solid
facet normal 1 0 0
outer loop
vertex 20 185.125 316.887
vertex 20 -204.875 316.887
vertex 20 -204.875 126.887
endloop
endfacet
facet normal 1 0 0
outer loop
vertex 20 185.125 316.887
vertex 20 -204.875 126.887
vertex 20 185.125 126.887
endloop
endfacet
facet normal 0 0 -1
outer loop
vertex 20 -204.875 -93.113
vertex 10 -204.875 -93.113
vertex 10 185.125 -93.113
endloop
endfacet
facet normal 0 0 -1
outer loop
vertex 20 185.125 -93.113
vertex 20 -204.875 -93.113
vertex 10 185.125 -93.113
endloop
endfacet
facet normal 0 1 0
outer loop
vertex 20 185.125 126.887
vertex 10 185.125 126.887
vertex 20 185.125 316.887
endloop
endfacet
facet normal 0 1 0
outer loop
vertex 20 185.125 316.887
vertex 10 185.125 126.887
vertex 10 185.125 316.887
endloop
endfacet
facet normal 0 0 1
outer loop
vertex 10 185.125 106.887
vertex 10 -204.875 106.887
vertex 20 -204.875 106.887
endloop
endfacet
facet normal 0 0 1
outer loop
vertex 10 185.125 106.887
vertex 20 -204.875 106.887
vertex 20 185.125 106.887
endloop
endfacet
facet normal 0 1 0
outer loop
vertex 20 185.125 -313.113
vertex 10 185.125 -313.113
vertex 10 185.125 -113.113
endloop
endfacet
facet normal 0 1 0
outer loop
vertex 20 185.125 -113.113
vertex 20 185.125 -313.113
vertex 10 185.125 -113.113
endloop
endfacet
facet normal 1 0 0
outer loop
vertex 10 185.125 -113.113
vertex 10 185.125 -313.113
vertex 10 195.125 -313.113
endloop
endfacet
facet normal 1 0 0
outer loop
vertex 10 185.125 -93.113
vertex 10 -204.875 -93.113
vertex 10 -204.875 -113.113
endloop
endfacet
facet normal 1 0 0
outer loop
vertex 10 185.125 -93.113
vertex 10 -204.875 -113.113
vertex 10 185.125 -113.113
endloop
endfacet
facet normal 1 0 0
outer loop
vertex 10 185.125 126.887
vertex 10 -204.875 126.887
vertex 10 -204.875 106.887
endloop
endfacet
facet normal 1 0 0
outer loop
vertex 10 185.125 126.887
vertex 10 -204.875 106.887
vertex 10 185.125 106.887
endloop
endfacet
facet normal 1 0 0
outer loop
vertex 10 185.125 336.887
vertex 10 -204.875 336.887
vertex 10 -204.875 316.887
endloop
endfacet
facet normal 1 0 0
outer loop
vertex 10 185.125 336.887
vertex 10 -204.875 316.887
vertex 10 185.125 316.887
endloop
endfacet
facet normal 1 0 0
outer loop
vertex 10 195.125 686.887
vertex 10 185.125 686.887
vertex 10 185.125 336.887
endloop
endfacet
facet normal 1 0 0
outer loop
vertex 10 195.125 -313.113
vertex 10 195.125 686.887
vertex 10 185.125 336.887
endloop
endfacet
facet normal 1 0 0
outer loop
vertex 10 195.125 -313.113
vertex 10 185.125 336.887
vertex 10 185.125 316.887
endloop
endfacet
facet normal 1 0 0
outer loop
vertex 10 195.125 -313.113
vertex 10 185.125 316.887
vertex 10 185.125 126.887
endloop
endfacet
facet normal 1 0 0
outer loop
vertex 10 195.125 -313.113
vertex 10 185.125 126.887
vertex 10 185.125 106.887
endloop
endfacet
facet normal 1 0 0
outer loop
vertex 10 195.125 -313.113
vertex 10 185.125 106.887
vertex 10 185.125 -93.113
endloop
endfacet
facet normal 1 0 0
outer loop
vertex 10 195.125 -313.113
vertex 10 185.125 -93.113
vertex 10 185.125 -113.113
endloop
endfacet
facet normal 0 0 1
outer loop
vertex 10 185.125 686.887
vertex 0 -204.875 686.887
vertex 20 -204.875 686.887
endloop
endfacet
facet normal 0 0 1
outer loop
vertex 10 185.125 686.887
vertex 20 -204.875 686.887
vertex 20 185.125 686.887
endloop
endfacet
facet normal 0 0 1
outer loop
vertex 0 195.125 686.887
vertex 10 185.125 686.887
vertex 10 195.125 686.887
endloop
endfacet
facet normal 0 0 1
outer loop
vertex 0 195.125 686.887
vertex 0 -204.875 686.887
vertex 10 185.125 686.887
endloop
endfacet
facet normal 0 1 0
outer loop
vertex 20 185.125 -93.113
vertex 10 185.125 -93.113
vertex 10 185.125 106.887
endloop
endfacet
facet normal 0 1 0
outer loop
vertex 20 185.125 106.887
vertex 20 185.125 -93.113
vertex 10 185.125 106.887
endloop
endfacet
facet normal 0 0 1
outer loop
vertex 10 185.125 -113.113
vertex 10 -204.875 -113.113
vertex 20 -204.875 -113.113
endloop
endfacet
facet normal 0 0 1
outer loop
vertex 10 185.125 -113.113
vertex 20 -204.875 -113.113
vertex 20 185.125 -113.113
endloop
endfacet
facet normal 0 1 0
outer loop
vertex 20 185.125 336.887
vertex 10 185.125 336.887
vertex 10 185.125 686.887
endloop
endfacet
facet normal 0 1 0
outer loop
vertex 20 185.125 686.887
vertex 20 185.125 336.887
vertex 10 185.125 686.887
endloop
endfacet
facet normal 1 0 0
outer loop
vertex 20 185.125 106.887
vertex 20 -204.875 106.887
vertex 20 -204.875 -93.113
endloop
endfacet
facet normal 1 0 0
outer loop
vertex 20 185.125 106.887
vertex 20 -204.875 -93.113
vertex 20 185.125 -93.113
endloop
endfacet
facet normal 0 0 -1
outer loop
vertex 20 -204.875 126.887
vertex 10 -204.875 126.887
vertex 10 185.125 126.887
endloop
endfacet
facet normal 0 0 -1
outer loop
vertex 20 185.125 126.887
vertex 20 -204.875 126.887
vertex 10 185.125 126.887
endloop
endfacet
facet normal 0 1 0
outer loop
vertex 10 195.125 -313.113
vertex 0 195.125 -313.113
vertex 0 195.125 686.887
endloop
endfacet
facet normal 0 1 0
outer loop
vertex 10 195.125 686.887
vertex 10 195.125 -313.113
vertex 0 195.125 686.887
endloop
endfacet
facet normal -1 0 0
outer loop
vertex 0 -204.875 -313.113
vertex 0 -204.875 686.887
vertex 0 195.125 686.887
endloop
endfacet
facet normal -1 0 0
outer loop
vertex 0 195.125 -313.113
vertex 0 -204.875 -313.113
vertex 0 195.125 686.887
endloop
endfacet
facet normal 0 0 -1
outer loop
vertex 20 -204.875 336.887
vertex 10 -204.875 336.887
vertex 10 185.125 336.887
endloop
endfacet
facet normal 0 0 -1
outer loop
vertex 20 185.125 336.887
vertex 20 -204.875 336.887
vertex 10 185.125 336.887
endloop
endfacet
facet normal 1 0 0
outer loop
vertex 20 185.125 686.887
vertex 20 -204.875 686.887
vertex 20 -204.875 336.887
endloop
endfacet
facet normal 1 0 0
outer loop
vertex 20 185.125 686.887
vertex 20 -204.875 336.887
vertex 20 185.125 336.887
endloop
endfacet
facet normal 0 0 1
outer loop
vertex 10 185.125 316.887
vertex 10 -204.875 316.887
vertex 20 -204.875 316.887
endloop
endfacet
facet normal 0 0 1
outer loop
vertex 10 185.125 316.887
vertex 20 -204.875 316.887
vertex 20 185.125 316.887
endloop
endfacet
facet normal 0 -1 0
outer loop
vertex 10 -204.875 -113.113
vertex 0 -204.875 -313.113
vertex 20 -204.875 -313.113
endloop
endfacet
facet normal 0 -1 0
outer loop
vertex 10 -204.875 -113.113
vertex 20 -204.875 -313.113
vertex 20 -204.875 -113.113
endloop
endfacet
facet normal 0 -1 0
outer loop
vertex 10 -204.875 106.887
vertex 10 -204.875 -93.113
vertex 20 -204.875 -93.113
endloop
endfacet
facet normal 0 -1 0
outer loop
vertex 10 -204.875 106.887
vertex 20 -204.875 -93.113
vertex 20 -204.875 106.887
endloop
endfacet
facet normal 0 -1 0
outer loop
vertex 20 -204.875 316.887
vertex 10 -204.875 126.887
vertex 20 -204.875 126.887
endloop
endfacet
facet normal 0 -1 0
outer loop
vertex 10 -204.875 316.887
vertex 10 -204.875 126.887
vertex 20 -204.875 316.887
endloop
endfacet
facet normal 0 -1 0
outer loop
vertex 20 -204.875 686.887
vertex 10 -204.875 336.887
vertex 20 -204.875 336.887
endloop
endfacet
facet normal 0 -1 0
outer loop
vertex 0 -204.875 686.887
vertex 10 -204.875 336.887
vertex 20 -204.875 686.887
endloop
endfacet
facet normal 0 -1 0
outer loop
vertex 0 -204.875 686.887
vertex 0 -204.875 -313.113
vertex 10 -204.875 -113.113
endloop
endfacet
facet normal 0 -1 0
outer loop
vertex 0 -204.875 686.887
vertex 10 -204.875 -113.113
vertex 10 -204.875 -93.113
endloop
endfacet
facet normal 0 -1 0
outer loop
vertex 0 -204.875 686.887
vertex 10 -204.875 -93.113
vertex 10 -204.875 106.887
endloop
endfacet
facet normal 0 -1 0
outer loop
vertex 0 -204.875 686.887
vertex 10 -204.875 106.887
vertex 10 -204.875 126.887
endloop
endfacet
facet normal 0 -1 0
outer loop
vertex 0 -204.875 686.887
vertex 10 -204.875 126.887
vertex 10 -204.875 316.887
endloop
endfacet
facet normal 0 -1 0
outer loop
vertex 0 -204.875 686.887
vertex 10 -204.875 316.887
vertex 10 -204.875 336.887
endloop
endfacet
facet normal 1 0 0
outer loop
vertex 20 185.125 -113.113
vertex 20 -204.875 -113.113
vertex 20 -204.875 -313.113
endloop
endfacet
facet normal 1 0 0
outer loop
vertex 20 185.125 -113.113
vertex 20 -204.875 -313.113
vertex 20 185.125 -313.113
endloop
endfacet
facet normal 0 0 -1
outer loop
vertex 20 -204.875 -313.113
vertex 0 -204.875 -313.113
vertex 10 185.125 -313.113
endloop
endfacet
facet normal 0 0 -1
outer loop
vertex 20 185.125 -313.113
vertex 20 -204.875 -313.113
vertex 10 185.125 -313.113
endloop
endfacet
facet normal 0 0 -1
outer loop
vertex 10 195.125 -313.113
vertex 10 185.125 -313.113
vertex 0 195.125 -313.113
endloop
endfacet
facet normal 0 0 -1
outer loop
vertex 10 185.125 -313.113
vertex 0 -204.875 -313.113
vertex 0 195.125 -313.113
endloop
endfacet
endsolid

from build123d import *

# Parameters (mm, degrees)
F0_W     = 10
F0_H     = 350
F0_H_2   = 20
F0_H_3   = 190
F0_H_4   = 200
F0_W_2   = 390
F1_DEPTH = 10
F2_DEPTH = 20


with BuildPart() as f1:
    # F0 (on Right) → F1 (new body)
    with BuildSketch(Plane.YZ):
        with Locations((190.124774985, 511.8865245837)):
            Rectangle(F0_W, F0_H)
        with Locations((190.124774985, 326.8865245837)):
            Rectangle(F0_W, F0_H_2)
        with Locations((190.124774985, 221.8865245837)):
            Rectangle(F0_W, F0_H_3)
        with Locations((190.124774985, 116.8865245837)):
            Rectangle(F0_W, F0_H_2)
        with Locations((190.124774985, 6.8865245837)):
            Rectangle(F0_W, F0_H_4)
        with Locations((190.124774985, -103.1134754163)):
            Rectangle(F0_W, F0_H_2)
        with Locations((190.124774985, -213.1134754163)):
            Rectangle(F0_W, F0_H_4)
        with Locations((-9.875225015, -103.1134754163)):
            Rectangle(F0_W_2, F0_H_2)
        with Locations((-9.875225015, 116.8865245837)):
            Rectangle(F0_W_2, F0_H_2)
        with Locations((-9.875225015, 326.8865245837)):
            Rectangle(F0_W_2, F0_H_2)
    extrude(amount=F1_DEPTH)

    # F0 (on Right) → F2 (join)
    with BuildSketch(Plane.YZ):
        with Locations((-9.875225015, 511.8865245837)):
            Rectangle(F0_W_2, F0_H)
        with Locations((-9.875225015, 221.8865245837)):
            Rectangle(F0_W_2, F0_H_3)
        with Locations((-9.875225015, 6.8865245837)):
            Rectangle(F0_W_2, F0_H_4)
        with Locations((-9.875225015, -213.1134754163)):
            Rectangle(F0_W_2, F0_H_4)
    extrude(amount=F2_DEPTH)


solid = f1.part
